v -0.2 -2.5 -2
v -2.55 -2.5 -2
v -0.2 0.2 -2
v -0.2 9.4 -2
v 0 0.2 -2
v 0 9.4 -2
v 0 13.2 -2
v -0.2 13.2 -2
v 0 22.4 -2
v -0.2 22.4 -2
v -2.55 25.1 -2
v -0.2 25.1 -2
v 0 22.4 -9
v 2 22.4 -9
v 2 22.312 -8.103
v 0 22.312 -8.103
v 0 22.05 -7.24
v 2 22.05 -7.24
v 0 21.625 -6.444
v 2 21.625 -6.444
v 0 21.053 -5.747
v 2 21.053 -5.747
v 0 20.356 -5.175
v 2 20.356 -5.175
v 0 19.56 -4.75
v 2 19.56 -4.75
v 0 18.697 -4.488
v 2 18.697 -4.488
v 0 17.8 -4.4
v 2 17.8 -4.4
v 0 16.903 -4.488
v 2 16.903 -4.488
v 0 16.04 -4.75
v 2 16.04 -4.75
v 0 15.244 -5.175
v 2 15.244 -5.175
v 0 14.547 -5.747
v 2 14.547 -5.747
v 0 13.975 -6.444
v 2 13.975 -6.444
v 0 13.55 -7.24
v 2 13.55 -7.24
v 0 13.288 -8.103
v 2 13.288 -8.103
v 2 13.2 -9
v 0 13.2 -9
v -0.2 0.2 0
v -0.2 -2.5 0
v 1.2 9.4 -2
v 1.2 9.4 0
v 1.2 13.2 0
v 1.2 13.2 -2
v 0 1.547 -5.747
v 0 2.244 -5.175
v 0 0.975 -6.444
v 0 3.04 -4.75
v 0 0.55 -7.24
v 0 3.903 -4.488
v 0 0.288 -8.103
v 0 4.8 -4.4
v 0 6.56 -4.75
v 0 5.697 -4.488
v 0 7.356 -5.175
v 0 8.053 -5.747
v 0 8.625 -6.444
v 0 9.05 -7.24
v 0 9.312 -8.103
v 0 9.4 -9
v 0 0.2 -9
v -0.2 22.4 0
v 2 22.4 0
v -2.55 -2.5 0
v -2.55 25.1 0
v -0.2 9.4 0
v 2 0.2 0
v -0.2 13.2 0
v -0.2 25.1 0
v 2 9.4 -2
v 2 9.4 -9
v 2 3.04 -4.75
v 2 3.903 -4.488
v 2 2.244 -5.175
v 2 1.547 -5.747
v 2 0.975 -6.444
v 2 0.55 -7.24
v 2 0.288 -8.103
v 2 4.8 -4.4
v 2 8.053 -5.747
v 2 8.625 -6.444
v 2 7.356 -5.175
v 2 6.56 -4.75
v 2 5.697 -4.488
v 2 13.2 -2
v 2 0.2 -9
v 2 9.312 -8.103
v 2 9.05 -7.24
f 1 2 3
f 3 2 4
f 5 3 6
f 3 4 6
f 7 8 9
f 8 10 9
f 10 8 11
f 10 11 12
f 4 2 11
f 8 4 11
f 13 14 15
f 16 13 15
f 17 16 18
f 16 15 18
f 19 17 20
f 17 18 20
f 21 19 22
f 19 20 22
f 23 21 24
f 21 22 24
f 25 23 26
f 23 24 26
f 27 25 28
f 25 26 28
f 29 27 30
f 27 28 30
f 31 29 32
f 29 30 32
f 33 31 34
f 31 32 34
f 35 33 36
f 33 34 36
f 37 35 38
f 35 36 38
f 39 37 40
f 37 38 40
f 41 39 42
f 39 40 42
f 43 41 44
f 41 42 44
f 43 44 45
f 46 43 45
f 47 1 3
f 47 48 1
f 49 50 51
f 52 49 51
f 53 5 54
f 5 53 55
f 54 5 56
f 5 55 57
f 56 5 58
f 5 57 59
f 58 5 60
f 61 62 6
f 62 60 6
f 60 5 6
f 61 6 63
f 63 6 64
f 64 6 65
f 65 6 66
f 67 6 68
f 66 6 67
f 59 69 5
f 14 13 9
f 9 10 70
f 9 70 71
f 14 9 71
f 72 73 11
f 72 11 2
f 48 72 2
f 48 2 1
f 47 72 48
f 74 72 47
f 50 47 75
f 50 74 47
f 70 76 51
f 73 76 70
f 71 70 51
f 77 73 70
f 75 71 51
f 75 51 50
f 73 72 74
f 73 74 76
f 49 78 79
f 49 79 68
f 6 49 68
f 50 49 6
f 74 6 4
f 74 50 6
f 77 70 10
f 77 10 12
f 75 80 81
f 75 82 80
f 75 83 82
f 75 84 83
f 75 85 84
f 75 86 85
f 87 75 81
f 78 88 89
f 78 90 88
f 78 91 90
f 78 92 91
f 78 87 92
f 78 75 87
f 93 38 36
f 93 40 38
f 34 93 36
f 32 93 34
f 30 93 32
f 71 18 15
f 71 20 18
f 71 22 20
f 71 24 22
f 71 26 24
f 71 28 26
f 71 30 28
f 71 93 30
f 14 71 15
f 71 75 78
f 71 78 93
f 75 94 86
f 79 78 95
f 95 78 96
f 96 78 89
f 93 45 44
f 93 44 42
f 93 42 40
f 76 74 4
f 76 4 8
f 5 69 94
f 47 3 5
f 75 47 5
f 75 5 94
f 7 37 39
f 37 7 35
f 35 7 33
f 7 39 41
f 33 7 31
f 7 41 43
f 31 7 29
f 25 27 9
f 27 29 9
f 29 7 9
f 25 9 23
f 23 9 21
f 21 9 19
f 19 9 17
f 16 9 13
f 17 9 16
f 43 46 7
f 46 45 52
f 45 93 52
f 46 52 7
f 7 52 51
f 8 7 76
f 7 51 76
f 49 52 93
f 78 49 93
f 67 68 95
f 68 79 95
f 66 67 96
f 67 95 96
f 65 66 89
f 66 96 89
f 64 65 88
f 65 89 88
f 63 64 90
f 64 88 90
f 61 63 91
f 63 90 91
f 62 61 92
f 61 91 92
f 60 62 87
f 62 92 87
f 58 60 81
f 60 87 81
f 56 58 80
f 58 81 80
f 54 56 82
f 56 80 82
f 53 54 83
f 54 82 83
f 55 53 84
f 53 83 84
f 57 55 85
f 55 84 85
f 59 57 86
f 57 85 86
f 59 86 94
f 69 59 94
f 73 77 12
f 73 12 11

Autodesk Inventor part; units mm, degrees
ref_plane "YZ Plane" through (0, 0, 0) normal (1, 0, 0) x (0, 1, 0)
ref_plane "XZ Plane" through (0, 0, 0) normal (0, 1, 0) x (-1, 0, 0)
ref_plane "XY Plane" through (0, 0, 0) normal (0, 0, 1) x (1, 0, 0)
sketch "Sketch1" plane through (0, 0, 0) normal (0, 0, 1) x (1, 0, 0)
  line L0 (0, 0) -> (0, -2.7) projected
  line L1 (0, -2.7) -> (-2.5, -2.7) projected
  line L2 (-2.5, -2.7) -> (-2.5, 25.3) projected
  line L3 (0, 25.3) -> (-2.5, 25.3) projected
  line L4 (0, 25.3) -> (0, 22.6) projected
  line L5 (0, 22.6) -> (2, 22.6) projected
  line L6 (2, 27.3) -> (2, 22.6) projected
  line L7 (-4.5, 27.3) -> (2, 27.3) projected
  line L8 (-4.5, -4.7) -> (-4.5, 27.3) projected
  line L9 (-4.5, -4.7) -> (2, -4.7) projected
  line L10 (2, 0) -> (2, -4.7) projected
  line L11 (0, 0) -> (2, 0) projected
  line L12 (-0.2, 25.1) -> (-2.55, 25.1)
  line L13 (-2.55, 25.1) -> (-2.55, -2.5)
  line L14 (-2.55, -2.5) -> (-0.2, -2.5)
  line L15 (-0.2, -2.5) -> (-0.2, 25.1)
  line L16 (0, 22.6) -> (0, 22.4) construction
  line L17 (1, 13) -> (2, 13) projected
  line L18 (1, 9.6) -> (1, 13) projected
  line L19 (2, 9.6) -> (1, 9.6) projected
  line L20 (2, 13) -> (2, 9.6) projected
  line L21 (1, 11.3) -> (1.2, 11.3) construction
  line L22 (2, 13) -> (1.2, 13)
  line L23 (1.2, 13) -> (1.2, 9.6)
  line L24 (1.2, 9.6) -> (2, 9.6)
  line L25 (2, 9.6) -> (2, 13)
  line L26 (1.2, 13) -> (1.2, 13.2)
  line L27 (2, 13.2) -> (-0.2, 13.2)
  line L28 (-0.2, 13.2) -> (-0.2, 22.4)
  line L29 (-0.2, 22.4) -> (2, 22.4)
  line L30 (2, 22.4) -> (2, 13.2)
  line L31 (2, 13.2) -> (2, 13)
  line L32 (2, 9.6) -> (1.2, 9.6)
  line L33 (1.2, 9.6) -> (1.2, 9.4)
  line L34 (1.2, 9.4) -> (2, 9.4)
  line L35 (2, 9.4) -> (2, 9.6)
  line L36 (2, 9.4) -> (-0.2, 9.4)
  line L37 (-0.2, 9.4) -> (-0.2, 0.2)
  line L38 (-0.2, 0.2) -> (2, 0.2)
  line L39 (2, 0.2) -> (2, 9.4)
  point P0 (-1.25, 11.3)
  point P1 (-1.25, 11.3)
  dimension "d0" = 2.35
  dimension "d1" = 27.6
  dimension "d2" = 0.2
  dimension "d3" = 0.2
  dimension "d4" = 0.2
  dimension "d5" = 0.2
  dimension "d6" = 9.2
extrude "Extrusion1" add sketch "Sketch1" against normal blind 2 contours L14 L13 L12 L2 | L2 L12 L15 L14 | L15 L36 L34 L39 L38 | L29 L30 L27 L15 | L33 L19 L35 L34 | L27 L31 L17 L26 | L23 L17 L20 L19
sketch "Sketch2" plane through (2, 0.2, 0) normal (1, 0, 0) x (0, 0, -1)
  arc A0 (9, -0.2) -> (9, 9.4) centre (9, 4.6) ccw projected
  arc A1 (9, 12.8) -> (9, 22.4) centre (9, 17.6) ccw projected
  circle A2 centre (9, 4.6) radius 4.6
  circle A3 centre (9, 17.6) radius 4.6
  line L0 (2, 22.2) -> (2, 0) projected
  line L1 (9, 0) -> (2, 0)
  line L2 (9, 9.2) -> (2, 9.2)
  line L3 (2, 0) -> (2, 9.2)
  line L4 (9, 13) -> (2, 13)
  line L5 (2, 13) -> (2, 22.2)
  line L6 (0, 22.2) -> (2, 22.2) projected
  line L7 (9, 22.2) -> (2, 22.2)
  point P0 (0, -0.2)
  dimension "d12" = 9.2
  dimension "d13" = 9.2
extrude "Extrusion3" add sketch "Sketch2" against normal blind 2 contours L0 L7 A3 L4 | A2 L1 L0 L2
properties part number "prototype7_2_3DPrint"
